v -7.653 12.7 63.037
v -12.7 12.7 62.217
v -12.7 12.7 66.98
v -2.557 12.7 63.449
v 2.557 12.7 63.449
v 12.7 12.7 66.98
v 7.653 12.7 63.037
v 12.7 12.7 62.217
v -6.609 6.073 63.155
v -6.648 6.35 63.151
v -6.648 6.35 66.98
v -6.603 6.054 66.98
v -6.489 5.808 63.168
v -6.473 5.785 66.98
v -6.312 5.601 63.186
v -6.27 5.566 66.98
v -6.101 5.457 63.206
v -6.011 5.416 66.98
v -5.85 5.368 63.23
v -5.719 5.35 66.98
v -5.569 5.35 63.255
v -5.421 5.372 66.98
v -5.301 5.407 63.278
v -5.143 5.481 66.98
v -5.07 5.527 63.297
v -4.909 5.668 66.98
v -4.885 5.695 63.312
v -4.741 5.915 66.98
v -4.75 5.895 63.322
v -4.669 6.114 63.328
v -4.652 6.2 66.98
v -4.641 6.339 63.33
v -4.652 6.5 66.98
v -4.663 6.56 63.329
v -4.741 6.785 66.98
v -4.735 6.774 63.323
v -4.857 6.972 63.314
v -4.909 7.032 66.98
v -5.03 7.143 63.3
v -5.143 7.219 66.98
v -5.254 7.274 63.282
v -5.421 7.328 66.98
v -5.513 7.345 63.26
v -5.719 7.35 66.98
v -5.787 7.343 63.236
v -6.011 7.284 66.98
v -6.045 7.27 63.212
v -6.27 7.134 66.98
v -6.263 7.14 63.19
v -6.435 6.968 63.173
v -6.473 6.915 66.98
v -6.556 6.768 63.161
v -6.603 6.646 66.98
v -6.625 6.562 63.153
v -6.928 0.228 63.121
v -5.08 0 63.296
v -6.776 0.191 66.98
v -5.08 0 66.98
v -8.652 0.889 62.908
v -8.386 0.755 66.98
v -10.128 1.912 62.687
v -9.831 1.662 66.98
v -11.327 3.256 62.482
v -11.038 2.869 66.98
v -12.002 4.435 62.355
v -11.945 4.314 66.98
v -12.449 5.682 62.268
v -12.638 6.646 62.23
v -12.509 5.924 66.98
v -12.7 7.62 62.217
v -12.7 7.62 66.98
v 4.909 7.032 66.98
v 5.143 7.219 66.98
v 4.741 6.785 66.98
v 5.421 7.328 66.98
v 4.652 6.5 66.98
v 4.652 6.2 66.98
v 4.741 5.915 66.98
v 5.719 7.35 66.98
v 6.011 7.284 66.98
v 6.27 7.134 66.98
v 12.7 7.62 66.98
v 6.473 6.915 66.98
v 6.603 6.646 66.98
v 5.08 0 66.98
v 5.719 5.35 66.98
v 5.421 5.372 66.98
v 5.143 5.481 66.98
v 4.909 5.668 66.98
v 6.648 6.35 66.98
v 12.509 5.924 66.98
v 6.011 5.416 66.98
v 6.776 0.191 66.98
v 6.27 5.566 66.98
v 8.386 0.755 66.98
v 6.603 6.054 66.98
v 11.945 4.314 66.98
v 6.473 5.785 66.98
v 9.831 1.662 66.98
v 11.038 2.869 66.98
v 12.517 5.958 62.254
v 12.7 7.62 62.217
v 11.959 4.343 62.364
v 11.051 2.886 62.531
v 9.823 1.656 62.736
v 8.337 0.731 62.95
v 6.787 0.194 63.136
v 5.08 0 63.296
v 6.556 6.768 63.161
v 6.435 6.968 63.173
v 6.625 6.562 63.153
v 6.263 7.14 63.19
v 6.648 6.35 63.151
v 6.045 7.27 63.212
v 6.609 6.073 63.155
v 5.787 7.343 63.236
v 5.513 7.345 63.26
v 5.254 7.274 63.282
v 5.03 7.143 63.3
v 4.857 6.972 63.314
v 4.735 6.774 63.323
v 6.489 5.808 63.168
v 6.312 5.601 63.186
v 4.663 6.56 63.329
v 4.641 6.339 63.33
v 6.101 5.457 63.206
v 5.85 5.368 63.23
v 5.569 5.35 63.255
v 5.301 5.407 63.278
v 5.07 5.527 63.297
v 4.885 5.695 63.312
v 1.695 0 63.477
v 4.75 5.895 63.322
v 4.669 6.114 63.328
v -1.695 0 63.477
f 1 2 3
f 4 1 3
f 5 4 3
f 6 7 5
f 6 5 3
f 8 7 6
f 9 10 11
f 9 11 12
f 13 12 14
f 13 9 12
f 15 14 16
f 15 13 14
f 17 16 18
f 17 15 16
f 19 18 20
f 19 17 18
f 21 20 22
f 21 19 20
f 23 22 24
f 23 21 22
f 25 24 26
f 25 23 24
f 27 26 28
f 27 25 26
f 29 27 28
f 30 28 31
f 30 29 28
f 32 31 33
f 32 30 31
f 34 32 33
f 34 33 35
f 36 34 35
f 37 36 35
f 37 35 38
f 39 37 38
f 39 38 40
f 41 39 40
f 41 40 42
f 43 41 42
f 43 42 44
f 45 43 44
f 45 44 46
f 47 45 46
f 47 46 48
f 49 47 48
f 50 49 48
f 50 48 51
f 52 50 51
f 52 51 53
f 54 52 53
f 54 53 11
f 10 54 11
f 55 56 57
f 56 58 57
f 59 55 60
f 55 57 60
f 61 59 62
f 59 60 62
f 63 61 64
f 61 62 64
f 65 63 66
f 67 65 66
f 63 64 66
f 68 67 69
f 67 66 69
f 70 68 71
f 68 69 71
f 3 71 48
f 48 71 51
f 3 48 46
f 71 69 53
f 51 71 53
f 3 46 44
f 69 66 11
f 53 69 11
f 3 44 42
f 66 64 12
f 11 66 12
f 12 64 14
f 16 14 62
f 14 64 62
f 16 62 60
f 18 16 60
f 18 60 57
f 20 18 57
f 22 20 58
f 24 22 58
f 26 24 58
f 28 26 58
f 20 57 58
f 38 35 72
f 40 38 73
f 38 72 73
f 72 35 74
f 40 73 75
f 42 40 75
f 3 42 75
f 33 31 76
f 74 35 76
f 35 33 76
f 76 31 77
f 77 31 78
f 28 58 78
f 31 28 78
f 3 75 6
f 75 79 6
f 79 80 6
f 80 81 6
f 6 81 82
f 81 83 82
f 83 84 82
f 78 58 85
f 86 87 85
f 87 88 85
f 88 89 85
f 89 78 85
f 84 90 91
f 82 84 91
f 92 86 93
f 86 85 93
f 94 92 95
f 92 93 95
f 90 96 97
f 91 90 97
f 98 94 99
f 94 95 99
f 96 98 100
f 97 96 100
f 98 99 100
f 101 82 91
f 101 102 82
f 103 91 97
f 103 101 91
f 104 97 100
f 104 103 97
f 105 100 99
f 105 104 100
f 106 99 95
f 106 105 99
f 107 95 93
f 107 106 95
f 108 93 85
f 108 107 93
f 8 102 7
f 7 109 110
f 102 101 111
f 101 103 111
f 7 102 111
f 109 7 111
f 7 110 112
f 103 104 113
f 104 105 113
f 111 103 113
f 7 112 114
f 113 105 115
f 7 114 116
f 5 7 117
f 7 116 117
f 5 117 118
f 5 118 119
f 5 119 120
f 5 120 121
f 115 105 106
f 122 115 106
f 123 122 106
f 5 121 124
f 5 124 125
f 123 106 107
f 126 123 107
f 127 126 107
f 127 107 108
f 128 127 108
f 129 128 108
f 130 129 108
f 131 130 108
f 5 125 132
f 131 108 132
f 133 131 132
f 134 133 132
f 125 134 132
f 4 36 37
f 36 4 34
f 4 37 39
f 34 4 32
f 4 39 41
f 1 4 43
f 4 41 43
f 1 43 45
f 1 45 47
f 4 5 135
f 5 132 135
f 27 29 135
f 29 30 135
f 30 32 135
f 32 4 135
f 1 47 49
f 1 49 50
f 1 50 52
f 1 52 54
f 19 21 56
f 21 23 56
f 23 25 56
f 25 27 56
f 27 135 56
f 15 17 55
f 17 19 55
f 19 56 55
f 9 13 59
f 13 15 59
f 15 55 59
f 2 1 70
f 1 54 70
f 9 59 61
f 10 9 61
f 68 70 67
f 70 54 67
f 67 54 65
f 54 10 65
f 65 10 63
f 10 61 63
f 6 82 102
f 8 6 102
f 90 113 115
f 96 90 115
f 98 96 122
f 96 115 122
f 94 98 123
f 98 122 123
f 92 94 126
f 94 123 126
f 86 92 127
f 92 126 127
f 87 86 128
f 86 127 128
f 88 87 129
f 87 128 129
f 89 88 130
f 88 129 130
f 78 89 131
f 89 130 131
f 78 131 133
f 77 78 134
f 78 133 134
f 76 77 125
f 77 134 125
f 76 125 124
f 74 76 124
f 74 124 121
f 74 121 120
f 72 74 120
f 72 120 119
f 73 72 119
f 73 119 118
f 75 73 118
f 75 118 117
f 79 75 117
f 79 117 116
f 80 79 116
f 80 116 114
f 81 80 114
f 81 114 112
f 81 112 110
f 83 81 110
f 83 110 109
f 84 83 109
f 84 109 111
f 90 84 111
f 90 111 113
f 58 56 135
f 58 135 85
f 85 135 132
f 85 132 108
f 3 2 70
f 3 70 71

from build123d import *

# Parameters (mm, degrees)
BOSS_EXTRUDE1_DEPTH = 12.7
SKETCH2_R           = 1.0033
CUT_EXTRUDE1_DEPTH  = 66.979539467
FILLET1_R           = 7.62


with BuildPart() as part:
    # Sketch1 → Boss-Extrude1 (new body)
    with BuildSketch(Plane(origin=(0, 0, 0), x_dir=(1, 0, 0), z_dir=(0, 1, 0))):
        with BuildLine():
            ThreePointArc((12.7, -62.217039467), (0, -63.5), (-12.7, -62.217039467))
            Line((-12.7, -62.217039467), (-12.7, -66.979539467))
            Line((-12.7, -66.979539467), (12.7, -66.979539467))
            Line((12.7, -66.979539467), (12.7, -62.217039467))
        make_face()
    extrude(amount=BOSS_EXTRUDE1_DEPTH)

    # Sketch2 → Cut-Extrude1 (cut)
    with BuildSketch(Plane.XY):
        with Locations(Location((-5.644444444, 6.35, 0), (0, 0, 180))):
            Circle(SKETCH2_R)
    cut_extrude1 = extrude(amount=CUT_EXTRUDE1_DEPTH, mode=Mode.SUBTRACT)

    # Mirror1: Cut-Extrude1 across plane
    add(cut_extrude1.mirror(Plane(origin=(0, 0, 0), x_dir=(0, 0, 1), z_dir=(1, 0, 0))), mode=Mode.SUBTRACT)

    # Fillet1
    fillet1_edges = [part.edges().sort_by_distance(p)[0] for p in [
        (12.7, 0, 64.598289467),
        (-12.7, 0, 64.598289467),
    ]]
    fillet(fillet1_edges, radius=FILLET1_R)


solid = part.part
